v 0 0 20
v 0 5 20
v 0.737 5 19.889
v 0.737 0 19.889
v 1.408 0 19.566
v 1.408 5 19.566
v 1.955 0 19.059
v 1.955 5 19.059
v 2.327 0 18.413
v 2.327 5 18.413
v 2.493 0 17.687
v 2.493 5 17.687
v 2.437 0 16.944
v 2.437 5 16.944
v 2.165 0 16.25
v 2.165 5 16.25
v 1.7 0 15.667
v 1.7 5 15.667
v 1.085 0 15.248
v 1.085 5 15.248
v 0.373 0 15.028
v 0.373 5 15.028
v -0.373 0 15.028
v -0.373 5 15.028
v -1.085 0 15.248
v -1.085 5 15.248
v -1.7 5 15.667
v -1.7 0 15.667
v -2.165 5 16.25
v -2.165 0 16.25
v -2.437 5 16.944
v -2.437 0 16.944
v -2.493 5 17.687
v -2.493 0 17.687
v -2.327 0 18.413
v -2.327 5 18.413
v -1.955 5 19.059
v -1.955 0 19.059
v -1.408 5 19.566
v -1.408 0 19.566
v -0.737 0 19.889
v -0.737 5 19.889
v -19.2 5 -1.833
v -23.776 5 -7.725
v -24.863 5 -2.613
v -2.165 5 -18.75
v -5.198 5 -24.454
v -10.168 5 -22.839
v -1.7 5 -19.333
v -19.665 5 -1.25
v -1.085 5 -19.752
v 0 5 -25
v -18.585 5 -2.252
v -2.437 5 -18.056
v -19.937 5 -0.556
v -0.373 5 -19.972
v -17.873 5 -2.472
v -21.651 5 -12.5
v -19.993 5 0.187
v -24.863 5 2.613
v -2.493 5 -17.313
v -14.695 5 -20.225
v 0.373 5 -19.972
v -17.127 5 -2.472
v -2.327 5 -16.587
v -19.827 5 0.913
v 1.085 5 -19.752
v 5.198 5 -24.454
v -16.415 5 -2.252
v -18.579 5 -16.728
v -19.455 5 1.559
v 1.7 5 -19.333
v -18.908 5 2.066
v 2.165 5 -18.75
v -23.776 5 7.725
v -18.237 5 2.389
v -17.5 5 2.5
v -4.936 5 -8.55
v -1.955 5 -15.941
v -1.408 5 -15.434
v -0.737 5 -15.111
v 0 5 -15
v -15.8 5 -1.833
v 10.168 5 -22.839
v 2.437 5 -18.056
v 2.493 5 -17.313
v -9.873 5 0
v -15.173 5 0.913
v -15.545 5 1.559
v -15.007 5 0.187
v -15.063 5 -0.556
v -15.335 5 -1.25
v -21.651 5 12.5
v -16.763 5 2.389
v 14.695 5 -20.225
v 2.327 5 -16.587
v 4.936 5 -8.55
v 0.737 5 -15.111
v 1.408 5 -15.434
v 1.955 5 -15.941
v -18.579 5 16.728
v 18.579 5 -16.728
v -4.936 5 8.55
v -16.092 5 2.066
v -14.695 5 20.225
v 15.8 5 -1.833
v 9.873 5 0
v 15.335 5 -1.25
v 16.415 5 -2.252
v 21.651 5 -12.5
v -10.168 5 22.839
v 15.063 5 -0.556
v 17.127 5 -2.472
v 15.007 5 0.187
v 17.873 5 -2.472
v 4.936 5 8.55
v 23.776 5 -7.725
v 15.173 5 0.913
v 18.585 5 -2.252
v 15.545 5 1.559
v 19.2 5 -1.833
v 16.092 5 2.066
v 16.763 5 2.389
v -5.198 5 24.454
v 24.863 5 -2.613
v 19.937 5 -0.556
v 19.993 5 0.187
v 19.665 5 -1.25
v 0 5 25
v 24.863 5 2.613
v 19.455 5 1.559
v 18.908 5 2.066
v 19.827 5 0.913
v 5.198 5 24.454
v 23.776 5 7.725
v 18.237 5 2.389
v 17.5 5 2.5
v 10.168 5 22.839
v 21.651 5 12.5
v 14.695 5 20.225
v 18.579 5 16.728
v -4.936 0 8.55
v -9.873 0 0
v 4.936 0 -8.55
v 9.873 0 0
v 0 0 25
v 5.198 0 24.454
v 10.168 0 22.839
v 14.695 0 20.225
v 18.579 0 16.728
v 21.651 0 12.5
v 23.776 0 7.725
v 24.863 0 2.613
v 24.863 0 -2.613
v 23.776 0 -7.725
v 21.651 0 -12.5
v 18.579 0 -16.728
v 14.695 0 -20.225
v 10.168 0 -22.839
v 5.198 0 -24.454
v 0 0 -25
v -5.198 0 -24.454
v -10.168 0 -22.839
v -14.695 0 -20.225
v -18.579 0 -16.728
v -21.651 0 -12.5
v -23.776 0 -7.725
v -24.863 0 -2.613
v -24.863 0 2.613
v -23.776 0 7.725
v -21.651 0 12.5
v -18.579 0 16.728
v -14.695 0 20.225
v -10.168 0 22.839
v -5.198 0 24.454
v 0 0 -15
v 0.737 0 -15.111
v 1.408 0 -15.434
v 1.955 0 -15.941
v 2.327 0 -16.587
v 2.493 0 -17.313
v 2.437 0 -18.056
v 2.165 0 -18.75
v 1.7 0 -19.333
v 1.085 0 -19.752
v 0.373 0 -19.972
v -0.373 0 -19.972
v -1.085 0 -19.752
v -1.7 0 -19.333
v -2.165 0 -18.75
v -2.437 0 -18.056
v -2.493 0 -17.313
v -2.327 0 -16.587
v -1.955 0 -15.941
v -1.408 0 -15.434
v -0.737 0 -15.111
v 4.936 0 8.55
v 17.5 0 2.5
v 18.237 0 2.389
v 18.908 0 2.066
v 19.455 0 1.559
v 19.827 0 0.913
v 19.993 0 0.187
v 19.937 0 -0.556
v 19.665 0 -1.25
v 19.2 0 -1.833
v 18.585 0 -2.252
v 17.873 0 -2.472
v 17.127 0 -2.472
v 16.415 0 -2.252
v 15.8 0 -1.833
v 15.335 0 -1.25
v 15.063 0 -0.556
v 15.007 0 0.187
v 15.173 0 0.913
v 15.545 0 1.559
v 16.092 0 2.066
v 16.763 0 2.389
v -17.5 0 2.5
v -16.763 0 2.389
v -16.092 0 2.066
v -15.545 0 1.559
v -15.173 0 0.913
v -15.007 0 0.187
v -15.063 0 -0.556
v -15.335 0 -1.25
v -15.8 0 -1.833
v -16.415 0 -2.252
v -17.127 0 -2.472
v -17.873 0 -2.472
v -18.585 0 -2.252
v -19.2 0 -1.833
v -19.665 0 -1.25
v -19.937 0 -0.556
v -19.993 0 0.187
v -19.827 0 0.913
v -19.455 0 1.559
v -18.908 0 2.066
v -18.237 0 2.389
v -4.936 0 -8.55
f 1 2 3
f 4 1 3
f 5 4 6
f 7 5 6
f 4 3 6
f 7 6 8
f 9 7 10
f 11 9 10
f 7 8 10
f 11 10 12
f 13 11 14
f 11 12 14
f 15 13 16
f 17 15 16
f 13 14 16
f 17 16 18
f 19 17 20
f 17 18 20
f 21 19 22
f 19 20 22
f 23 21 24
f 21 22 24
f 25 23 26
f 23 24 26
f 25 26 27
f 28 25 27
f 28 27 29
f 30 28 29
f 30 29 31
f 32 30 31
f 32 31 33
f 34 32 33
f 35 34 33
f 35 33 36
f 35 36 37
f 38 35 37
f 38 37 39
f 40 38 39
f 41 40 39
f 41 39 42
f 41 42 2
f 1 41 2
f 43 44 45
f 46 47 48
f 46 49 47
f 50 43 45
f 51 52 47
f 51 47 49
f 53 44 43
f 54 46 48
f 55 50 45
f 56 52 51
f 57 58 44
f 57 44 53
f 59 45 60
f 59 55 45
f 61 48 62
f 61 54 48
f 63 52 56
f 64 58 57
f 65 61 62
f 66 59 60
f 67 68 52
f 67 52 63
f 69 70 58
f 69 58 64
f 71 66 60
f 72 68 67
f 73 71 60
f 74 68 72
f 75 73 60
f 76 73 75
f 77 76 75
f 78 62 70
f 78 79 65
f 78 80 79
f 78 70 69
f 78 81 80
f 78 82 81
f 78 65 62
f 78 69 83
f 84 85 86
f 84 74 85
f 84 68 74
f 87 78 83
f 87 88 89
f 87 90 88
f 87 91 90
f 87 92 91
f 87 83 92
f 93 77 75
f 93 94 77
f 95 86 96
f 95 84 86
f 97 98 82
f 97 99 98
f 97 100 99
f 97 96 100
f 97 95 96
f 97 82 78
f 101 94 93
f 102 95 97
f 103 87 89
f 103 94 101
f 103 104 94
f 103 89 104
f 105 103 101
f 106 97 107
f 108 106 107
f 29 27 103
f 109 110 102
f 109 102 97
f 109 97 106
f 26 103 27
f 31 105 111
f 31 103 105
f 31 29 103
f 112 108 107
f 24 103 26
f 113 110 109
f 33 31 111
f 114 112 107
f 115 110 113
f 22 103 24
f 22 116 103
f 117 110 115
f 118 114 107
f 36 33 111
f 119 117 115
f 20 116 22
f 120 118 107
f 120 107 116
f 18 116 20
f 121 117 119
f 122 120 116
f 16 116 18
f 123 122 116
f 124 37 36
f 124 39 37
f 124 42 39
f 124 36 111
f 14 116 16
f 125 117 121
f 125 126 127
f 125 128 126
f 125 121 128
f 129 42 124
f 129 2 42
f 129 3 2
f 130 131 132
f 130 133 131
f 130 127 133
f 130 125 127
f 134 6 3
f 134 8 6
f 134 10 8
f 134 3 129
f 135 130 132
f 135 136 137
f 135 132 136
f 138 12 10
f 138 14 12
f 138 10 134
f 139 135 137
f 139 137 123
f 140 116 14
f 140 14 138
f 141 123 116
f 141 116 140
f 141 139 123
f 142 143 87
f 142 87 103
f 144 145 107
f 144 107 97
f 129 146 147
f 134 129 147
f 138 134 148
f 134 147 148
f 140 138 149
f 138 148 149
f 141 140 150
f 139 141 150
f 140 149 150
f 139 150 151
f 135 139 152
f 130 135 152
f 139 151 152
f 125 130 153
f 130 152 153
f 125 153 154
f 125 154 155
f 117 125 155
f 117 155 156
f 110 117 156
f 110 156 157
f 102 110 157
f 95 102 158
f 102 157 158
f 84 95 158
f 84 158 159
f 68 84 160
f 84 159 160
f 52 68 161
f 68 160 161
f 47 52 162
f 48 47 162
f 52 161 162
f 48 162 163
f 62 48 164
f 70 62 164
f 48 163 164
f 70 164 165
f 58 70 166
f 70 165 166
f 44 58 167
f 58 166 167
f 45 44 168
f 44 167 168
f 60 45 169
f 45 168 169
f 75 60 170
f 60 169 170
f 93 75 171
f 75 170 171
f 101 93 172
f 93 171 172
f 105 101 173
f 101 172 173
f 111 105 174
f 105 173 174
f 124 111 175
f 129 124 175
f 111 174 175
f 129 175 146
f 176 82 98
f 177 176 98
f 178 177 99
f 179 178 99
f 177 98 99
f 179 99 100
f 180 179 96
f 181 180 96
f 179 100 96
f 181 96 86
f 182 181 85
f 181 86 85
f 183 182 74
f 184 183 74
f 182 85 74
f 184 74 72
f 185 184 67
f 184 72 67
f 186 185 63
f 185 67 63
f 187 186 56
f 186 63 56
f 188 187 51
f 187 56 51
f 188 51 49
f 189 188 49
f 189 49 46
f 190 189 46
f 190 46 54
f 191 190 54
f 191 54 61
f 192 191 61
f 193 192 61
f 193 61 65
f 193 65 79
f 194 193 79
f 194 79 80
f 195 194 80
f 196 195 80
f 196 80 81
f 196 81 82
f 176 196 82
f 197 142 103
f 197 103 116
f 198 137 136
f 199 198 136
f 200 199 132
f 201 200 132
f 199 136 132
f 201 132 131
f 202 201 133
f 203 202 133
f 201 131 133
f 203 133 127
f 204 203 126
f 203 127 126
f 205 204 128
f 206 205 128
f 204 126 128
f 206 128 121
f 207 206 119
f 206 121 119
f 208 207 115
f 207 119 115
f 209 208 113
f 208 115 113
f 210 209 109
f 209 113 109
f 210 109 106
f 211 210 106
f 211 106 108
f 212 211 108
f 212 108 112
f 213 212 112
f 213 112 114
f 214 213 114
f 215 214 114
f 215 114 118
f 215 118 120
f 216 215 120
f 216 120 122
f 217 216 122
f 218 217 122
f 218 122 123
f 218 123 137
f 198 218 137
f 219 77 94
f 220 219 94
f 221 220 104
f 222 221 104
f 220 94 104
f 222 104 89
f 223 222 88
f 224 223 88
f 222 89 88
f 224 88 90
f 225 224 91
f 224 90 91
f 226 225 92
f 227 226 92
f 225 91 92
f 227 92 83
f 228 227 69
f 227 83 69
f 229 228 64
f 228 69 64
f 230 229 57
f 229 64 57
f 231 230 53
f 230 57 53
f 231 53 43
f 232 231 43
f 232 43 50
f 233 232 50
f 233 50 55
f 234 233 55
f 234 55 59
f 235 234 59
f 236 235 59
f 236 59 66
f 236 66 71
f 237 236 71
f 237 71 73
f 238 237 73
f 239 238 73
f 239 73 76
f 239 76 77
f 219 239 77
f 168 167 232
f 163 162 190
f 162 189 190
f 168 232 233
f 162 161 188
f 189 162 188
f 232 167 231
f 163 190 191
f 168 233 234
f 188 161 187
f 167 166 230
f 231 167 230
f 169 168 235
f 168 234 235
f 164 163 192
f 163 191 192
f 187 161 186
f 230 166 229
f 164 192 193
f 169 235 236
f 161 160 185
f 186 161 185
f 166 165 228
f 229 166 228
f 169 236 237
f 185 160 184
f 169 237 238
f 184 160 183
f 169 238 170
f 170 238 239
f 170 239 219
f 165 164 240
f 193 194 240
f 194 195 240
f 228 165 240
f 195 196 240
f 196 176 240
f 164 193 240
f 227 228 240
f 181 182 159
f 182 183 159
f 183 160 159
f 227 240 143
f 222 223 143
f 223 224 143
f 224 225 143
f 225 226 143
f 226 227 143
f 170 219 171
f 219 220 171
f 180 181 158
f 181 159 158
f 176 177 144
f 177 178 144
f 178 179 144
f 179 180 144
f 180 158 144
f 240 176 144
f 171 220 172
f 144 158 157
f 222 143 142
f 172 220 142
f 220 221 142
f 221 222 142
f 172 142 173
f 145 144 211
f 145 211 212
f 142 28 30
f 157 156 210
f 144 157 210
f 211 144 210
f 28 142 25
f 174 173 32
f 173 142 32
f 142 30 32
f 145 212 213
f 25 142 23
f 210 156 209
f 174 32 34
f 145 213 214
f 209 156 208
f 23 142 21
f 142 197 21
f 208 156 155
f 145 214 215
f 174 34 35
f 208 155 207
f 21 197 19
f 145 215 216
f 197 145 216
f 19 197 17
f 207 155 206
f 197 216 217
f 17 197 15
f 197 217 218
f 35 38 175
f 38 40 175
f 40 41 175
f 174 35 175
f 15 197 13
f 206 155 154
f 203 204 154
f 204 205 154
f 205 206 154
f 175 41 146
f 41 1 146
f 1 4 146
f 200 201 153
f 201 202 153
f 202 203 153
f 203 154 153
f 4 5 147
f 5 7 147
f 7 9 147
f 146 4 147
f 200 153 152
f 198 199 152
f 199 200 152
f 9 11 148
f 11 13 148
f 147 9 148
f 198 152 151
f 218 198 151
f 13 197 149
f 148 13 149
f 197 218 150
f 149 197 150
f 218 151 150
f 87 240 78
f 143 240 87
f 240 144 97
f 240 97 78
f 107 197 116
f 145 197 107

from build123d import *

# Parameters (mm, degrees)
SKETCH1_R           = 25
BOSS_EXTRUDE1_DEPTH = 5
SKETCH3_R           = 2.5
CUT_EXTRUDE1_DEPTH  = 18


with BuildPart() as part:
    # Sketch1 → Boss-Extrude1 (new body)
    with BuildSketch(Plane(origin=(0, 0, 0), x_dir=(1, 0, 0), z_dir=(0, 1, 0))):
        with Locations(Location((0, 0, 0), (0, 0, 270))):
            Circle(SKETCH1_R)
        Polygon((-9.872689603, 0), (-4.936344802, -8.55), (4.936344802, -8.55), (9.872689603, 0), (4.936344802, 8.55), (-4.936344802, 8.55), align=None, mode=Mode.SUBTRACT)
    extrude(amount=BOSS_EXTRUDE1_DEPTH)

    # Sketch3 → Cut-Extrude1 (cut)
    with BuildSketch(Plane(origin=(0, 5, 0), x_dir=(1, 0, 0), z_dir=(0, 1, 0))):
        with Locations(Location((0, 17.5, 0), (0, 0, 270))):
            Circle(SKETCH3_R)
        with Locations(Location((17.5, 0, 0), (0, 0, 270))):
            Circle(SKETCH3_R)
        with Locations(Location((0, -17.5, 0), (0, 0, 270))):
            Circle(SKETCH3_R)
        with Locations(Location((-17.5, 0, 0), (0, 0, 270))):
            Circle(SKETCH3_R)
    extrude(amount=-CUT_EXTRUDE1_DEPTH, mode=Mode.SUBTRACT)


solid = part.part
